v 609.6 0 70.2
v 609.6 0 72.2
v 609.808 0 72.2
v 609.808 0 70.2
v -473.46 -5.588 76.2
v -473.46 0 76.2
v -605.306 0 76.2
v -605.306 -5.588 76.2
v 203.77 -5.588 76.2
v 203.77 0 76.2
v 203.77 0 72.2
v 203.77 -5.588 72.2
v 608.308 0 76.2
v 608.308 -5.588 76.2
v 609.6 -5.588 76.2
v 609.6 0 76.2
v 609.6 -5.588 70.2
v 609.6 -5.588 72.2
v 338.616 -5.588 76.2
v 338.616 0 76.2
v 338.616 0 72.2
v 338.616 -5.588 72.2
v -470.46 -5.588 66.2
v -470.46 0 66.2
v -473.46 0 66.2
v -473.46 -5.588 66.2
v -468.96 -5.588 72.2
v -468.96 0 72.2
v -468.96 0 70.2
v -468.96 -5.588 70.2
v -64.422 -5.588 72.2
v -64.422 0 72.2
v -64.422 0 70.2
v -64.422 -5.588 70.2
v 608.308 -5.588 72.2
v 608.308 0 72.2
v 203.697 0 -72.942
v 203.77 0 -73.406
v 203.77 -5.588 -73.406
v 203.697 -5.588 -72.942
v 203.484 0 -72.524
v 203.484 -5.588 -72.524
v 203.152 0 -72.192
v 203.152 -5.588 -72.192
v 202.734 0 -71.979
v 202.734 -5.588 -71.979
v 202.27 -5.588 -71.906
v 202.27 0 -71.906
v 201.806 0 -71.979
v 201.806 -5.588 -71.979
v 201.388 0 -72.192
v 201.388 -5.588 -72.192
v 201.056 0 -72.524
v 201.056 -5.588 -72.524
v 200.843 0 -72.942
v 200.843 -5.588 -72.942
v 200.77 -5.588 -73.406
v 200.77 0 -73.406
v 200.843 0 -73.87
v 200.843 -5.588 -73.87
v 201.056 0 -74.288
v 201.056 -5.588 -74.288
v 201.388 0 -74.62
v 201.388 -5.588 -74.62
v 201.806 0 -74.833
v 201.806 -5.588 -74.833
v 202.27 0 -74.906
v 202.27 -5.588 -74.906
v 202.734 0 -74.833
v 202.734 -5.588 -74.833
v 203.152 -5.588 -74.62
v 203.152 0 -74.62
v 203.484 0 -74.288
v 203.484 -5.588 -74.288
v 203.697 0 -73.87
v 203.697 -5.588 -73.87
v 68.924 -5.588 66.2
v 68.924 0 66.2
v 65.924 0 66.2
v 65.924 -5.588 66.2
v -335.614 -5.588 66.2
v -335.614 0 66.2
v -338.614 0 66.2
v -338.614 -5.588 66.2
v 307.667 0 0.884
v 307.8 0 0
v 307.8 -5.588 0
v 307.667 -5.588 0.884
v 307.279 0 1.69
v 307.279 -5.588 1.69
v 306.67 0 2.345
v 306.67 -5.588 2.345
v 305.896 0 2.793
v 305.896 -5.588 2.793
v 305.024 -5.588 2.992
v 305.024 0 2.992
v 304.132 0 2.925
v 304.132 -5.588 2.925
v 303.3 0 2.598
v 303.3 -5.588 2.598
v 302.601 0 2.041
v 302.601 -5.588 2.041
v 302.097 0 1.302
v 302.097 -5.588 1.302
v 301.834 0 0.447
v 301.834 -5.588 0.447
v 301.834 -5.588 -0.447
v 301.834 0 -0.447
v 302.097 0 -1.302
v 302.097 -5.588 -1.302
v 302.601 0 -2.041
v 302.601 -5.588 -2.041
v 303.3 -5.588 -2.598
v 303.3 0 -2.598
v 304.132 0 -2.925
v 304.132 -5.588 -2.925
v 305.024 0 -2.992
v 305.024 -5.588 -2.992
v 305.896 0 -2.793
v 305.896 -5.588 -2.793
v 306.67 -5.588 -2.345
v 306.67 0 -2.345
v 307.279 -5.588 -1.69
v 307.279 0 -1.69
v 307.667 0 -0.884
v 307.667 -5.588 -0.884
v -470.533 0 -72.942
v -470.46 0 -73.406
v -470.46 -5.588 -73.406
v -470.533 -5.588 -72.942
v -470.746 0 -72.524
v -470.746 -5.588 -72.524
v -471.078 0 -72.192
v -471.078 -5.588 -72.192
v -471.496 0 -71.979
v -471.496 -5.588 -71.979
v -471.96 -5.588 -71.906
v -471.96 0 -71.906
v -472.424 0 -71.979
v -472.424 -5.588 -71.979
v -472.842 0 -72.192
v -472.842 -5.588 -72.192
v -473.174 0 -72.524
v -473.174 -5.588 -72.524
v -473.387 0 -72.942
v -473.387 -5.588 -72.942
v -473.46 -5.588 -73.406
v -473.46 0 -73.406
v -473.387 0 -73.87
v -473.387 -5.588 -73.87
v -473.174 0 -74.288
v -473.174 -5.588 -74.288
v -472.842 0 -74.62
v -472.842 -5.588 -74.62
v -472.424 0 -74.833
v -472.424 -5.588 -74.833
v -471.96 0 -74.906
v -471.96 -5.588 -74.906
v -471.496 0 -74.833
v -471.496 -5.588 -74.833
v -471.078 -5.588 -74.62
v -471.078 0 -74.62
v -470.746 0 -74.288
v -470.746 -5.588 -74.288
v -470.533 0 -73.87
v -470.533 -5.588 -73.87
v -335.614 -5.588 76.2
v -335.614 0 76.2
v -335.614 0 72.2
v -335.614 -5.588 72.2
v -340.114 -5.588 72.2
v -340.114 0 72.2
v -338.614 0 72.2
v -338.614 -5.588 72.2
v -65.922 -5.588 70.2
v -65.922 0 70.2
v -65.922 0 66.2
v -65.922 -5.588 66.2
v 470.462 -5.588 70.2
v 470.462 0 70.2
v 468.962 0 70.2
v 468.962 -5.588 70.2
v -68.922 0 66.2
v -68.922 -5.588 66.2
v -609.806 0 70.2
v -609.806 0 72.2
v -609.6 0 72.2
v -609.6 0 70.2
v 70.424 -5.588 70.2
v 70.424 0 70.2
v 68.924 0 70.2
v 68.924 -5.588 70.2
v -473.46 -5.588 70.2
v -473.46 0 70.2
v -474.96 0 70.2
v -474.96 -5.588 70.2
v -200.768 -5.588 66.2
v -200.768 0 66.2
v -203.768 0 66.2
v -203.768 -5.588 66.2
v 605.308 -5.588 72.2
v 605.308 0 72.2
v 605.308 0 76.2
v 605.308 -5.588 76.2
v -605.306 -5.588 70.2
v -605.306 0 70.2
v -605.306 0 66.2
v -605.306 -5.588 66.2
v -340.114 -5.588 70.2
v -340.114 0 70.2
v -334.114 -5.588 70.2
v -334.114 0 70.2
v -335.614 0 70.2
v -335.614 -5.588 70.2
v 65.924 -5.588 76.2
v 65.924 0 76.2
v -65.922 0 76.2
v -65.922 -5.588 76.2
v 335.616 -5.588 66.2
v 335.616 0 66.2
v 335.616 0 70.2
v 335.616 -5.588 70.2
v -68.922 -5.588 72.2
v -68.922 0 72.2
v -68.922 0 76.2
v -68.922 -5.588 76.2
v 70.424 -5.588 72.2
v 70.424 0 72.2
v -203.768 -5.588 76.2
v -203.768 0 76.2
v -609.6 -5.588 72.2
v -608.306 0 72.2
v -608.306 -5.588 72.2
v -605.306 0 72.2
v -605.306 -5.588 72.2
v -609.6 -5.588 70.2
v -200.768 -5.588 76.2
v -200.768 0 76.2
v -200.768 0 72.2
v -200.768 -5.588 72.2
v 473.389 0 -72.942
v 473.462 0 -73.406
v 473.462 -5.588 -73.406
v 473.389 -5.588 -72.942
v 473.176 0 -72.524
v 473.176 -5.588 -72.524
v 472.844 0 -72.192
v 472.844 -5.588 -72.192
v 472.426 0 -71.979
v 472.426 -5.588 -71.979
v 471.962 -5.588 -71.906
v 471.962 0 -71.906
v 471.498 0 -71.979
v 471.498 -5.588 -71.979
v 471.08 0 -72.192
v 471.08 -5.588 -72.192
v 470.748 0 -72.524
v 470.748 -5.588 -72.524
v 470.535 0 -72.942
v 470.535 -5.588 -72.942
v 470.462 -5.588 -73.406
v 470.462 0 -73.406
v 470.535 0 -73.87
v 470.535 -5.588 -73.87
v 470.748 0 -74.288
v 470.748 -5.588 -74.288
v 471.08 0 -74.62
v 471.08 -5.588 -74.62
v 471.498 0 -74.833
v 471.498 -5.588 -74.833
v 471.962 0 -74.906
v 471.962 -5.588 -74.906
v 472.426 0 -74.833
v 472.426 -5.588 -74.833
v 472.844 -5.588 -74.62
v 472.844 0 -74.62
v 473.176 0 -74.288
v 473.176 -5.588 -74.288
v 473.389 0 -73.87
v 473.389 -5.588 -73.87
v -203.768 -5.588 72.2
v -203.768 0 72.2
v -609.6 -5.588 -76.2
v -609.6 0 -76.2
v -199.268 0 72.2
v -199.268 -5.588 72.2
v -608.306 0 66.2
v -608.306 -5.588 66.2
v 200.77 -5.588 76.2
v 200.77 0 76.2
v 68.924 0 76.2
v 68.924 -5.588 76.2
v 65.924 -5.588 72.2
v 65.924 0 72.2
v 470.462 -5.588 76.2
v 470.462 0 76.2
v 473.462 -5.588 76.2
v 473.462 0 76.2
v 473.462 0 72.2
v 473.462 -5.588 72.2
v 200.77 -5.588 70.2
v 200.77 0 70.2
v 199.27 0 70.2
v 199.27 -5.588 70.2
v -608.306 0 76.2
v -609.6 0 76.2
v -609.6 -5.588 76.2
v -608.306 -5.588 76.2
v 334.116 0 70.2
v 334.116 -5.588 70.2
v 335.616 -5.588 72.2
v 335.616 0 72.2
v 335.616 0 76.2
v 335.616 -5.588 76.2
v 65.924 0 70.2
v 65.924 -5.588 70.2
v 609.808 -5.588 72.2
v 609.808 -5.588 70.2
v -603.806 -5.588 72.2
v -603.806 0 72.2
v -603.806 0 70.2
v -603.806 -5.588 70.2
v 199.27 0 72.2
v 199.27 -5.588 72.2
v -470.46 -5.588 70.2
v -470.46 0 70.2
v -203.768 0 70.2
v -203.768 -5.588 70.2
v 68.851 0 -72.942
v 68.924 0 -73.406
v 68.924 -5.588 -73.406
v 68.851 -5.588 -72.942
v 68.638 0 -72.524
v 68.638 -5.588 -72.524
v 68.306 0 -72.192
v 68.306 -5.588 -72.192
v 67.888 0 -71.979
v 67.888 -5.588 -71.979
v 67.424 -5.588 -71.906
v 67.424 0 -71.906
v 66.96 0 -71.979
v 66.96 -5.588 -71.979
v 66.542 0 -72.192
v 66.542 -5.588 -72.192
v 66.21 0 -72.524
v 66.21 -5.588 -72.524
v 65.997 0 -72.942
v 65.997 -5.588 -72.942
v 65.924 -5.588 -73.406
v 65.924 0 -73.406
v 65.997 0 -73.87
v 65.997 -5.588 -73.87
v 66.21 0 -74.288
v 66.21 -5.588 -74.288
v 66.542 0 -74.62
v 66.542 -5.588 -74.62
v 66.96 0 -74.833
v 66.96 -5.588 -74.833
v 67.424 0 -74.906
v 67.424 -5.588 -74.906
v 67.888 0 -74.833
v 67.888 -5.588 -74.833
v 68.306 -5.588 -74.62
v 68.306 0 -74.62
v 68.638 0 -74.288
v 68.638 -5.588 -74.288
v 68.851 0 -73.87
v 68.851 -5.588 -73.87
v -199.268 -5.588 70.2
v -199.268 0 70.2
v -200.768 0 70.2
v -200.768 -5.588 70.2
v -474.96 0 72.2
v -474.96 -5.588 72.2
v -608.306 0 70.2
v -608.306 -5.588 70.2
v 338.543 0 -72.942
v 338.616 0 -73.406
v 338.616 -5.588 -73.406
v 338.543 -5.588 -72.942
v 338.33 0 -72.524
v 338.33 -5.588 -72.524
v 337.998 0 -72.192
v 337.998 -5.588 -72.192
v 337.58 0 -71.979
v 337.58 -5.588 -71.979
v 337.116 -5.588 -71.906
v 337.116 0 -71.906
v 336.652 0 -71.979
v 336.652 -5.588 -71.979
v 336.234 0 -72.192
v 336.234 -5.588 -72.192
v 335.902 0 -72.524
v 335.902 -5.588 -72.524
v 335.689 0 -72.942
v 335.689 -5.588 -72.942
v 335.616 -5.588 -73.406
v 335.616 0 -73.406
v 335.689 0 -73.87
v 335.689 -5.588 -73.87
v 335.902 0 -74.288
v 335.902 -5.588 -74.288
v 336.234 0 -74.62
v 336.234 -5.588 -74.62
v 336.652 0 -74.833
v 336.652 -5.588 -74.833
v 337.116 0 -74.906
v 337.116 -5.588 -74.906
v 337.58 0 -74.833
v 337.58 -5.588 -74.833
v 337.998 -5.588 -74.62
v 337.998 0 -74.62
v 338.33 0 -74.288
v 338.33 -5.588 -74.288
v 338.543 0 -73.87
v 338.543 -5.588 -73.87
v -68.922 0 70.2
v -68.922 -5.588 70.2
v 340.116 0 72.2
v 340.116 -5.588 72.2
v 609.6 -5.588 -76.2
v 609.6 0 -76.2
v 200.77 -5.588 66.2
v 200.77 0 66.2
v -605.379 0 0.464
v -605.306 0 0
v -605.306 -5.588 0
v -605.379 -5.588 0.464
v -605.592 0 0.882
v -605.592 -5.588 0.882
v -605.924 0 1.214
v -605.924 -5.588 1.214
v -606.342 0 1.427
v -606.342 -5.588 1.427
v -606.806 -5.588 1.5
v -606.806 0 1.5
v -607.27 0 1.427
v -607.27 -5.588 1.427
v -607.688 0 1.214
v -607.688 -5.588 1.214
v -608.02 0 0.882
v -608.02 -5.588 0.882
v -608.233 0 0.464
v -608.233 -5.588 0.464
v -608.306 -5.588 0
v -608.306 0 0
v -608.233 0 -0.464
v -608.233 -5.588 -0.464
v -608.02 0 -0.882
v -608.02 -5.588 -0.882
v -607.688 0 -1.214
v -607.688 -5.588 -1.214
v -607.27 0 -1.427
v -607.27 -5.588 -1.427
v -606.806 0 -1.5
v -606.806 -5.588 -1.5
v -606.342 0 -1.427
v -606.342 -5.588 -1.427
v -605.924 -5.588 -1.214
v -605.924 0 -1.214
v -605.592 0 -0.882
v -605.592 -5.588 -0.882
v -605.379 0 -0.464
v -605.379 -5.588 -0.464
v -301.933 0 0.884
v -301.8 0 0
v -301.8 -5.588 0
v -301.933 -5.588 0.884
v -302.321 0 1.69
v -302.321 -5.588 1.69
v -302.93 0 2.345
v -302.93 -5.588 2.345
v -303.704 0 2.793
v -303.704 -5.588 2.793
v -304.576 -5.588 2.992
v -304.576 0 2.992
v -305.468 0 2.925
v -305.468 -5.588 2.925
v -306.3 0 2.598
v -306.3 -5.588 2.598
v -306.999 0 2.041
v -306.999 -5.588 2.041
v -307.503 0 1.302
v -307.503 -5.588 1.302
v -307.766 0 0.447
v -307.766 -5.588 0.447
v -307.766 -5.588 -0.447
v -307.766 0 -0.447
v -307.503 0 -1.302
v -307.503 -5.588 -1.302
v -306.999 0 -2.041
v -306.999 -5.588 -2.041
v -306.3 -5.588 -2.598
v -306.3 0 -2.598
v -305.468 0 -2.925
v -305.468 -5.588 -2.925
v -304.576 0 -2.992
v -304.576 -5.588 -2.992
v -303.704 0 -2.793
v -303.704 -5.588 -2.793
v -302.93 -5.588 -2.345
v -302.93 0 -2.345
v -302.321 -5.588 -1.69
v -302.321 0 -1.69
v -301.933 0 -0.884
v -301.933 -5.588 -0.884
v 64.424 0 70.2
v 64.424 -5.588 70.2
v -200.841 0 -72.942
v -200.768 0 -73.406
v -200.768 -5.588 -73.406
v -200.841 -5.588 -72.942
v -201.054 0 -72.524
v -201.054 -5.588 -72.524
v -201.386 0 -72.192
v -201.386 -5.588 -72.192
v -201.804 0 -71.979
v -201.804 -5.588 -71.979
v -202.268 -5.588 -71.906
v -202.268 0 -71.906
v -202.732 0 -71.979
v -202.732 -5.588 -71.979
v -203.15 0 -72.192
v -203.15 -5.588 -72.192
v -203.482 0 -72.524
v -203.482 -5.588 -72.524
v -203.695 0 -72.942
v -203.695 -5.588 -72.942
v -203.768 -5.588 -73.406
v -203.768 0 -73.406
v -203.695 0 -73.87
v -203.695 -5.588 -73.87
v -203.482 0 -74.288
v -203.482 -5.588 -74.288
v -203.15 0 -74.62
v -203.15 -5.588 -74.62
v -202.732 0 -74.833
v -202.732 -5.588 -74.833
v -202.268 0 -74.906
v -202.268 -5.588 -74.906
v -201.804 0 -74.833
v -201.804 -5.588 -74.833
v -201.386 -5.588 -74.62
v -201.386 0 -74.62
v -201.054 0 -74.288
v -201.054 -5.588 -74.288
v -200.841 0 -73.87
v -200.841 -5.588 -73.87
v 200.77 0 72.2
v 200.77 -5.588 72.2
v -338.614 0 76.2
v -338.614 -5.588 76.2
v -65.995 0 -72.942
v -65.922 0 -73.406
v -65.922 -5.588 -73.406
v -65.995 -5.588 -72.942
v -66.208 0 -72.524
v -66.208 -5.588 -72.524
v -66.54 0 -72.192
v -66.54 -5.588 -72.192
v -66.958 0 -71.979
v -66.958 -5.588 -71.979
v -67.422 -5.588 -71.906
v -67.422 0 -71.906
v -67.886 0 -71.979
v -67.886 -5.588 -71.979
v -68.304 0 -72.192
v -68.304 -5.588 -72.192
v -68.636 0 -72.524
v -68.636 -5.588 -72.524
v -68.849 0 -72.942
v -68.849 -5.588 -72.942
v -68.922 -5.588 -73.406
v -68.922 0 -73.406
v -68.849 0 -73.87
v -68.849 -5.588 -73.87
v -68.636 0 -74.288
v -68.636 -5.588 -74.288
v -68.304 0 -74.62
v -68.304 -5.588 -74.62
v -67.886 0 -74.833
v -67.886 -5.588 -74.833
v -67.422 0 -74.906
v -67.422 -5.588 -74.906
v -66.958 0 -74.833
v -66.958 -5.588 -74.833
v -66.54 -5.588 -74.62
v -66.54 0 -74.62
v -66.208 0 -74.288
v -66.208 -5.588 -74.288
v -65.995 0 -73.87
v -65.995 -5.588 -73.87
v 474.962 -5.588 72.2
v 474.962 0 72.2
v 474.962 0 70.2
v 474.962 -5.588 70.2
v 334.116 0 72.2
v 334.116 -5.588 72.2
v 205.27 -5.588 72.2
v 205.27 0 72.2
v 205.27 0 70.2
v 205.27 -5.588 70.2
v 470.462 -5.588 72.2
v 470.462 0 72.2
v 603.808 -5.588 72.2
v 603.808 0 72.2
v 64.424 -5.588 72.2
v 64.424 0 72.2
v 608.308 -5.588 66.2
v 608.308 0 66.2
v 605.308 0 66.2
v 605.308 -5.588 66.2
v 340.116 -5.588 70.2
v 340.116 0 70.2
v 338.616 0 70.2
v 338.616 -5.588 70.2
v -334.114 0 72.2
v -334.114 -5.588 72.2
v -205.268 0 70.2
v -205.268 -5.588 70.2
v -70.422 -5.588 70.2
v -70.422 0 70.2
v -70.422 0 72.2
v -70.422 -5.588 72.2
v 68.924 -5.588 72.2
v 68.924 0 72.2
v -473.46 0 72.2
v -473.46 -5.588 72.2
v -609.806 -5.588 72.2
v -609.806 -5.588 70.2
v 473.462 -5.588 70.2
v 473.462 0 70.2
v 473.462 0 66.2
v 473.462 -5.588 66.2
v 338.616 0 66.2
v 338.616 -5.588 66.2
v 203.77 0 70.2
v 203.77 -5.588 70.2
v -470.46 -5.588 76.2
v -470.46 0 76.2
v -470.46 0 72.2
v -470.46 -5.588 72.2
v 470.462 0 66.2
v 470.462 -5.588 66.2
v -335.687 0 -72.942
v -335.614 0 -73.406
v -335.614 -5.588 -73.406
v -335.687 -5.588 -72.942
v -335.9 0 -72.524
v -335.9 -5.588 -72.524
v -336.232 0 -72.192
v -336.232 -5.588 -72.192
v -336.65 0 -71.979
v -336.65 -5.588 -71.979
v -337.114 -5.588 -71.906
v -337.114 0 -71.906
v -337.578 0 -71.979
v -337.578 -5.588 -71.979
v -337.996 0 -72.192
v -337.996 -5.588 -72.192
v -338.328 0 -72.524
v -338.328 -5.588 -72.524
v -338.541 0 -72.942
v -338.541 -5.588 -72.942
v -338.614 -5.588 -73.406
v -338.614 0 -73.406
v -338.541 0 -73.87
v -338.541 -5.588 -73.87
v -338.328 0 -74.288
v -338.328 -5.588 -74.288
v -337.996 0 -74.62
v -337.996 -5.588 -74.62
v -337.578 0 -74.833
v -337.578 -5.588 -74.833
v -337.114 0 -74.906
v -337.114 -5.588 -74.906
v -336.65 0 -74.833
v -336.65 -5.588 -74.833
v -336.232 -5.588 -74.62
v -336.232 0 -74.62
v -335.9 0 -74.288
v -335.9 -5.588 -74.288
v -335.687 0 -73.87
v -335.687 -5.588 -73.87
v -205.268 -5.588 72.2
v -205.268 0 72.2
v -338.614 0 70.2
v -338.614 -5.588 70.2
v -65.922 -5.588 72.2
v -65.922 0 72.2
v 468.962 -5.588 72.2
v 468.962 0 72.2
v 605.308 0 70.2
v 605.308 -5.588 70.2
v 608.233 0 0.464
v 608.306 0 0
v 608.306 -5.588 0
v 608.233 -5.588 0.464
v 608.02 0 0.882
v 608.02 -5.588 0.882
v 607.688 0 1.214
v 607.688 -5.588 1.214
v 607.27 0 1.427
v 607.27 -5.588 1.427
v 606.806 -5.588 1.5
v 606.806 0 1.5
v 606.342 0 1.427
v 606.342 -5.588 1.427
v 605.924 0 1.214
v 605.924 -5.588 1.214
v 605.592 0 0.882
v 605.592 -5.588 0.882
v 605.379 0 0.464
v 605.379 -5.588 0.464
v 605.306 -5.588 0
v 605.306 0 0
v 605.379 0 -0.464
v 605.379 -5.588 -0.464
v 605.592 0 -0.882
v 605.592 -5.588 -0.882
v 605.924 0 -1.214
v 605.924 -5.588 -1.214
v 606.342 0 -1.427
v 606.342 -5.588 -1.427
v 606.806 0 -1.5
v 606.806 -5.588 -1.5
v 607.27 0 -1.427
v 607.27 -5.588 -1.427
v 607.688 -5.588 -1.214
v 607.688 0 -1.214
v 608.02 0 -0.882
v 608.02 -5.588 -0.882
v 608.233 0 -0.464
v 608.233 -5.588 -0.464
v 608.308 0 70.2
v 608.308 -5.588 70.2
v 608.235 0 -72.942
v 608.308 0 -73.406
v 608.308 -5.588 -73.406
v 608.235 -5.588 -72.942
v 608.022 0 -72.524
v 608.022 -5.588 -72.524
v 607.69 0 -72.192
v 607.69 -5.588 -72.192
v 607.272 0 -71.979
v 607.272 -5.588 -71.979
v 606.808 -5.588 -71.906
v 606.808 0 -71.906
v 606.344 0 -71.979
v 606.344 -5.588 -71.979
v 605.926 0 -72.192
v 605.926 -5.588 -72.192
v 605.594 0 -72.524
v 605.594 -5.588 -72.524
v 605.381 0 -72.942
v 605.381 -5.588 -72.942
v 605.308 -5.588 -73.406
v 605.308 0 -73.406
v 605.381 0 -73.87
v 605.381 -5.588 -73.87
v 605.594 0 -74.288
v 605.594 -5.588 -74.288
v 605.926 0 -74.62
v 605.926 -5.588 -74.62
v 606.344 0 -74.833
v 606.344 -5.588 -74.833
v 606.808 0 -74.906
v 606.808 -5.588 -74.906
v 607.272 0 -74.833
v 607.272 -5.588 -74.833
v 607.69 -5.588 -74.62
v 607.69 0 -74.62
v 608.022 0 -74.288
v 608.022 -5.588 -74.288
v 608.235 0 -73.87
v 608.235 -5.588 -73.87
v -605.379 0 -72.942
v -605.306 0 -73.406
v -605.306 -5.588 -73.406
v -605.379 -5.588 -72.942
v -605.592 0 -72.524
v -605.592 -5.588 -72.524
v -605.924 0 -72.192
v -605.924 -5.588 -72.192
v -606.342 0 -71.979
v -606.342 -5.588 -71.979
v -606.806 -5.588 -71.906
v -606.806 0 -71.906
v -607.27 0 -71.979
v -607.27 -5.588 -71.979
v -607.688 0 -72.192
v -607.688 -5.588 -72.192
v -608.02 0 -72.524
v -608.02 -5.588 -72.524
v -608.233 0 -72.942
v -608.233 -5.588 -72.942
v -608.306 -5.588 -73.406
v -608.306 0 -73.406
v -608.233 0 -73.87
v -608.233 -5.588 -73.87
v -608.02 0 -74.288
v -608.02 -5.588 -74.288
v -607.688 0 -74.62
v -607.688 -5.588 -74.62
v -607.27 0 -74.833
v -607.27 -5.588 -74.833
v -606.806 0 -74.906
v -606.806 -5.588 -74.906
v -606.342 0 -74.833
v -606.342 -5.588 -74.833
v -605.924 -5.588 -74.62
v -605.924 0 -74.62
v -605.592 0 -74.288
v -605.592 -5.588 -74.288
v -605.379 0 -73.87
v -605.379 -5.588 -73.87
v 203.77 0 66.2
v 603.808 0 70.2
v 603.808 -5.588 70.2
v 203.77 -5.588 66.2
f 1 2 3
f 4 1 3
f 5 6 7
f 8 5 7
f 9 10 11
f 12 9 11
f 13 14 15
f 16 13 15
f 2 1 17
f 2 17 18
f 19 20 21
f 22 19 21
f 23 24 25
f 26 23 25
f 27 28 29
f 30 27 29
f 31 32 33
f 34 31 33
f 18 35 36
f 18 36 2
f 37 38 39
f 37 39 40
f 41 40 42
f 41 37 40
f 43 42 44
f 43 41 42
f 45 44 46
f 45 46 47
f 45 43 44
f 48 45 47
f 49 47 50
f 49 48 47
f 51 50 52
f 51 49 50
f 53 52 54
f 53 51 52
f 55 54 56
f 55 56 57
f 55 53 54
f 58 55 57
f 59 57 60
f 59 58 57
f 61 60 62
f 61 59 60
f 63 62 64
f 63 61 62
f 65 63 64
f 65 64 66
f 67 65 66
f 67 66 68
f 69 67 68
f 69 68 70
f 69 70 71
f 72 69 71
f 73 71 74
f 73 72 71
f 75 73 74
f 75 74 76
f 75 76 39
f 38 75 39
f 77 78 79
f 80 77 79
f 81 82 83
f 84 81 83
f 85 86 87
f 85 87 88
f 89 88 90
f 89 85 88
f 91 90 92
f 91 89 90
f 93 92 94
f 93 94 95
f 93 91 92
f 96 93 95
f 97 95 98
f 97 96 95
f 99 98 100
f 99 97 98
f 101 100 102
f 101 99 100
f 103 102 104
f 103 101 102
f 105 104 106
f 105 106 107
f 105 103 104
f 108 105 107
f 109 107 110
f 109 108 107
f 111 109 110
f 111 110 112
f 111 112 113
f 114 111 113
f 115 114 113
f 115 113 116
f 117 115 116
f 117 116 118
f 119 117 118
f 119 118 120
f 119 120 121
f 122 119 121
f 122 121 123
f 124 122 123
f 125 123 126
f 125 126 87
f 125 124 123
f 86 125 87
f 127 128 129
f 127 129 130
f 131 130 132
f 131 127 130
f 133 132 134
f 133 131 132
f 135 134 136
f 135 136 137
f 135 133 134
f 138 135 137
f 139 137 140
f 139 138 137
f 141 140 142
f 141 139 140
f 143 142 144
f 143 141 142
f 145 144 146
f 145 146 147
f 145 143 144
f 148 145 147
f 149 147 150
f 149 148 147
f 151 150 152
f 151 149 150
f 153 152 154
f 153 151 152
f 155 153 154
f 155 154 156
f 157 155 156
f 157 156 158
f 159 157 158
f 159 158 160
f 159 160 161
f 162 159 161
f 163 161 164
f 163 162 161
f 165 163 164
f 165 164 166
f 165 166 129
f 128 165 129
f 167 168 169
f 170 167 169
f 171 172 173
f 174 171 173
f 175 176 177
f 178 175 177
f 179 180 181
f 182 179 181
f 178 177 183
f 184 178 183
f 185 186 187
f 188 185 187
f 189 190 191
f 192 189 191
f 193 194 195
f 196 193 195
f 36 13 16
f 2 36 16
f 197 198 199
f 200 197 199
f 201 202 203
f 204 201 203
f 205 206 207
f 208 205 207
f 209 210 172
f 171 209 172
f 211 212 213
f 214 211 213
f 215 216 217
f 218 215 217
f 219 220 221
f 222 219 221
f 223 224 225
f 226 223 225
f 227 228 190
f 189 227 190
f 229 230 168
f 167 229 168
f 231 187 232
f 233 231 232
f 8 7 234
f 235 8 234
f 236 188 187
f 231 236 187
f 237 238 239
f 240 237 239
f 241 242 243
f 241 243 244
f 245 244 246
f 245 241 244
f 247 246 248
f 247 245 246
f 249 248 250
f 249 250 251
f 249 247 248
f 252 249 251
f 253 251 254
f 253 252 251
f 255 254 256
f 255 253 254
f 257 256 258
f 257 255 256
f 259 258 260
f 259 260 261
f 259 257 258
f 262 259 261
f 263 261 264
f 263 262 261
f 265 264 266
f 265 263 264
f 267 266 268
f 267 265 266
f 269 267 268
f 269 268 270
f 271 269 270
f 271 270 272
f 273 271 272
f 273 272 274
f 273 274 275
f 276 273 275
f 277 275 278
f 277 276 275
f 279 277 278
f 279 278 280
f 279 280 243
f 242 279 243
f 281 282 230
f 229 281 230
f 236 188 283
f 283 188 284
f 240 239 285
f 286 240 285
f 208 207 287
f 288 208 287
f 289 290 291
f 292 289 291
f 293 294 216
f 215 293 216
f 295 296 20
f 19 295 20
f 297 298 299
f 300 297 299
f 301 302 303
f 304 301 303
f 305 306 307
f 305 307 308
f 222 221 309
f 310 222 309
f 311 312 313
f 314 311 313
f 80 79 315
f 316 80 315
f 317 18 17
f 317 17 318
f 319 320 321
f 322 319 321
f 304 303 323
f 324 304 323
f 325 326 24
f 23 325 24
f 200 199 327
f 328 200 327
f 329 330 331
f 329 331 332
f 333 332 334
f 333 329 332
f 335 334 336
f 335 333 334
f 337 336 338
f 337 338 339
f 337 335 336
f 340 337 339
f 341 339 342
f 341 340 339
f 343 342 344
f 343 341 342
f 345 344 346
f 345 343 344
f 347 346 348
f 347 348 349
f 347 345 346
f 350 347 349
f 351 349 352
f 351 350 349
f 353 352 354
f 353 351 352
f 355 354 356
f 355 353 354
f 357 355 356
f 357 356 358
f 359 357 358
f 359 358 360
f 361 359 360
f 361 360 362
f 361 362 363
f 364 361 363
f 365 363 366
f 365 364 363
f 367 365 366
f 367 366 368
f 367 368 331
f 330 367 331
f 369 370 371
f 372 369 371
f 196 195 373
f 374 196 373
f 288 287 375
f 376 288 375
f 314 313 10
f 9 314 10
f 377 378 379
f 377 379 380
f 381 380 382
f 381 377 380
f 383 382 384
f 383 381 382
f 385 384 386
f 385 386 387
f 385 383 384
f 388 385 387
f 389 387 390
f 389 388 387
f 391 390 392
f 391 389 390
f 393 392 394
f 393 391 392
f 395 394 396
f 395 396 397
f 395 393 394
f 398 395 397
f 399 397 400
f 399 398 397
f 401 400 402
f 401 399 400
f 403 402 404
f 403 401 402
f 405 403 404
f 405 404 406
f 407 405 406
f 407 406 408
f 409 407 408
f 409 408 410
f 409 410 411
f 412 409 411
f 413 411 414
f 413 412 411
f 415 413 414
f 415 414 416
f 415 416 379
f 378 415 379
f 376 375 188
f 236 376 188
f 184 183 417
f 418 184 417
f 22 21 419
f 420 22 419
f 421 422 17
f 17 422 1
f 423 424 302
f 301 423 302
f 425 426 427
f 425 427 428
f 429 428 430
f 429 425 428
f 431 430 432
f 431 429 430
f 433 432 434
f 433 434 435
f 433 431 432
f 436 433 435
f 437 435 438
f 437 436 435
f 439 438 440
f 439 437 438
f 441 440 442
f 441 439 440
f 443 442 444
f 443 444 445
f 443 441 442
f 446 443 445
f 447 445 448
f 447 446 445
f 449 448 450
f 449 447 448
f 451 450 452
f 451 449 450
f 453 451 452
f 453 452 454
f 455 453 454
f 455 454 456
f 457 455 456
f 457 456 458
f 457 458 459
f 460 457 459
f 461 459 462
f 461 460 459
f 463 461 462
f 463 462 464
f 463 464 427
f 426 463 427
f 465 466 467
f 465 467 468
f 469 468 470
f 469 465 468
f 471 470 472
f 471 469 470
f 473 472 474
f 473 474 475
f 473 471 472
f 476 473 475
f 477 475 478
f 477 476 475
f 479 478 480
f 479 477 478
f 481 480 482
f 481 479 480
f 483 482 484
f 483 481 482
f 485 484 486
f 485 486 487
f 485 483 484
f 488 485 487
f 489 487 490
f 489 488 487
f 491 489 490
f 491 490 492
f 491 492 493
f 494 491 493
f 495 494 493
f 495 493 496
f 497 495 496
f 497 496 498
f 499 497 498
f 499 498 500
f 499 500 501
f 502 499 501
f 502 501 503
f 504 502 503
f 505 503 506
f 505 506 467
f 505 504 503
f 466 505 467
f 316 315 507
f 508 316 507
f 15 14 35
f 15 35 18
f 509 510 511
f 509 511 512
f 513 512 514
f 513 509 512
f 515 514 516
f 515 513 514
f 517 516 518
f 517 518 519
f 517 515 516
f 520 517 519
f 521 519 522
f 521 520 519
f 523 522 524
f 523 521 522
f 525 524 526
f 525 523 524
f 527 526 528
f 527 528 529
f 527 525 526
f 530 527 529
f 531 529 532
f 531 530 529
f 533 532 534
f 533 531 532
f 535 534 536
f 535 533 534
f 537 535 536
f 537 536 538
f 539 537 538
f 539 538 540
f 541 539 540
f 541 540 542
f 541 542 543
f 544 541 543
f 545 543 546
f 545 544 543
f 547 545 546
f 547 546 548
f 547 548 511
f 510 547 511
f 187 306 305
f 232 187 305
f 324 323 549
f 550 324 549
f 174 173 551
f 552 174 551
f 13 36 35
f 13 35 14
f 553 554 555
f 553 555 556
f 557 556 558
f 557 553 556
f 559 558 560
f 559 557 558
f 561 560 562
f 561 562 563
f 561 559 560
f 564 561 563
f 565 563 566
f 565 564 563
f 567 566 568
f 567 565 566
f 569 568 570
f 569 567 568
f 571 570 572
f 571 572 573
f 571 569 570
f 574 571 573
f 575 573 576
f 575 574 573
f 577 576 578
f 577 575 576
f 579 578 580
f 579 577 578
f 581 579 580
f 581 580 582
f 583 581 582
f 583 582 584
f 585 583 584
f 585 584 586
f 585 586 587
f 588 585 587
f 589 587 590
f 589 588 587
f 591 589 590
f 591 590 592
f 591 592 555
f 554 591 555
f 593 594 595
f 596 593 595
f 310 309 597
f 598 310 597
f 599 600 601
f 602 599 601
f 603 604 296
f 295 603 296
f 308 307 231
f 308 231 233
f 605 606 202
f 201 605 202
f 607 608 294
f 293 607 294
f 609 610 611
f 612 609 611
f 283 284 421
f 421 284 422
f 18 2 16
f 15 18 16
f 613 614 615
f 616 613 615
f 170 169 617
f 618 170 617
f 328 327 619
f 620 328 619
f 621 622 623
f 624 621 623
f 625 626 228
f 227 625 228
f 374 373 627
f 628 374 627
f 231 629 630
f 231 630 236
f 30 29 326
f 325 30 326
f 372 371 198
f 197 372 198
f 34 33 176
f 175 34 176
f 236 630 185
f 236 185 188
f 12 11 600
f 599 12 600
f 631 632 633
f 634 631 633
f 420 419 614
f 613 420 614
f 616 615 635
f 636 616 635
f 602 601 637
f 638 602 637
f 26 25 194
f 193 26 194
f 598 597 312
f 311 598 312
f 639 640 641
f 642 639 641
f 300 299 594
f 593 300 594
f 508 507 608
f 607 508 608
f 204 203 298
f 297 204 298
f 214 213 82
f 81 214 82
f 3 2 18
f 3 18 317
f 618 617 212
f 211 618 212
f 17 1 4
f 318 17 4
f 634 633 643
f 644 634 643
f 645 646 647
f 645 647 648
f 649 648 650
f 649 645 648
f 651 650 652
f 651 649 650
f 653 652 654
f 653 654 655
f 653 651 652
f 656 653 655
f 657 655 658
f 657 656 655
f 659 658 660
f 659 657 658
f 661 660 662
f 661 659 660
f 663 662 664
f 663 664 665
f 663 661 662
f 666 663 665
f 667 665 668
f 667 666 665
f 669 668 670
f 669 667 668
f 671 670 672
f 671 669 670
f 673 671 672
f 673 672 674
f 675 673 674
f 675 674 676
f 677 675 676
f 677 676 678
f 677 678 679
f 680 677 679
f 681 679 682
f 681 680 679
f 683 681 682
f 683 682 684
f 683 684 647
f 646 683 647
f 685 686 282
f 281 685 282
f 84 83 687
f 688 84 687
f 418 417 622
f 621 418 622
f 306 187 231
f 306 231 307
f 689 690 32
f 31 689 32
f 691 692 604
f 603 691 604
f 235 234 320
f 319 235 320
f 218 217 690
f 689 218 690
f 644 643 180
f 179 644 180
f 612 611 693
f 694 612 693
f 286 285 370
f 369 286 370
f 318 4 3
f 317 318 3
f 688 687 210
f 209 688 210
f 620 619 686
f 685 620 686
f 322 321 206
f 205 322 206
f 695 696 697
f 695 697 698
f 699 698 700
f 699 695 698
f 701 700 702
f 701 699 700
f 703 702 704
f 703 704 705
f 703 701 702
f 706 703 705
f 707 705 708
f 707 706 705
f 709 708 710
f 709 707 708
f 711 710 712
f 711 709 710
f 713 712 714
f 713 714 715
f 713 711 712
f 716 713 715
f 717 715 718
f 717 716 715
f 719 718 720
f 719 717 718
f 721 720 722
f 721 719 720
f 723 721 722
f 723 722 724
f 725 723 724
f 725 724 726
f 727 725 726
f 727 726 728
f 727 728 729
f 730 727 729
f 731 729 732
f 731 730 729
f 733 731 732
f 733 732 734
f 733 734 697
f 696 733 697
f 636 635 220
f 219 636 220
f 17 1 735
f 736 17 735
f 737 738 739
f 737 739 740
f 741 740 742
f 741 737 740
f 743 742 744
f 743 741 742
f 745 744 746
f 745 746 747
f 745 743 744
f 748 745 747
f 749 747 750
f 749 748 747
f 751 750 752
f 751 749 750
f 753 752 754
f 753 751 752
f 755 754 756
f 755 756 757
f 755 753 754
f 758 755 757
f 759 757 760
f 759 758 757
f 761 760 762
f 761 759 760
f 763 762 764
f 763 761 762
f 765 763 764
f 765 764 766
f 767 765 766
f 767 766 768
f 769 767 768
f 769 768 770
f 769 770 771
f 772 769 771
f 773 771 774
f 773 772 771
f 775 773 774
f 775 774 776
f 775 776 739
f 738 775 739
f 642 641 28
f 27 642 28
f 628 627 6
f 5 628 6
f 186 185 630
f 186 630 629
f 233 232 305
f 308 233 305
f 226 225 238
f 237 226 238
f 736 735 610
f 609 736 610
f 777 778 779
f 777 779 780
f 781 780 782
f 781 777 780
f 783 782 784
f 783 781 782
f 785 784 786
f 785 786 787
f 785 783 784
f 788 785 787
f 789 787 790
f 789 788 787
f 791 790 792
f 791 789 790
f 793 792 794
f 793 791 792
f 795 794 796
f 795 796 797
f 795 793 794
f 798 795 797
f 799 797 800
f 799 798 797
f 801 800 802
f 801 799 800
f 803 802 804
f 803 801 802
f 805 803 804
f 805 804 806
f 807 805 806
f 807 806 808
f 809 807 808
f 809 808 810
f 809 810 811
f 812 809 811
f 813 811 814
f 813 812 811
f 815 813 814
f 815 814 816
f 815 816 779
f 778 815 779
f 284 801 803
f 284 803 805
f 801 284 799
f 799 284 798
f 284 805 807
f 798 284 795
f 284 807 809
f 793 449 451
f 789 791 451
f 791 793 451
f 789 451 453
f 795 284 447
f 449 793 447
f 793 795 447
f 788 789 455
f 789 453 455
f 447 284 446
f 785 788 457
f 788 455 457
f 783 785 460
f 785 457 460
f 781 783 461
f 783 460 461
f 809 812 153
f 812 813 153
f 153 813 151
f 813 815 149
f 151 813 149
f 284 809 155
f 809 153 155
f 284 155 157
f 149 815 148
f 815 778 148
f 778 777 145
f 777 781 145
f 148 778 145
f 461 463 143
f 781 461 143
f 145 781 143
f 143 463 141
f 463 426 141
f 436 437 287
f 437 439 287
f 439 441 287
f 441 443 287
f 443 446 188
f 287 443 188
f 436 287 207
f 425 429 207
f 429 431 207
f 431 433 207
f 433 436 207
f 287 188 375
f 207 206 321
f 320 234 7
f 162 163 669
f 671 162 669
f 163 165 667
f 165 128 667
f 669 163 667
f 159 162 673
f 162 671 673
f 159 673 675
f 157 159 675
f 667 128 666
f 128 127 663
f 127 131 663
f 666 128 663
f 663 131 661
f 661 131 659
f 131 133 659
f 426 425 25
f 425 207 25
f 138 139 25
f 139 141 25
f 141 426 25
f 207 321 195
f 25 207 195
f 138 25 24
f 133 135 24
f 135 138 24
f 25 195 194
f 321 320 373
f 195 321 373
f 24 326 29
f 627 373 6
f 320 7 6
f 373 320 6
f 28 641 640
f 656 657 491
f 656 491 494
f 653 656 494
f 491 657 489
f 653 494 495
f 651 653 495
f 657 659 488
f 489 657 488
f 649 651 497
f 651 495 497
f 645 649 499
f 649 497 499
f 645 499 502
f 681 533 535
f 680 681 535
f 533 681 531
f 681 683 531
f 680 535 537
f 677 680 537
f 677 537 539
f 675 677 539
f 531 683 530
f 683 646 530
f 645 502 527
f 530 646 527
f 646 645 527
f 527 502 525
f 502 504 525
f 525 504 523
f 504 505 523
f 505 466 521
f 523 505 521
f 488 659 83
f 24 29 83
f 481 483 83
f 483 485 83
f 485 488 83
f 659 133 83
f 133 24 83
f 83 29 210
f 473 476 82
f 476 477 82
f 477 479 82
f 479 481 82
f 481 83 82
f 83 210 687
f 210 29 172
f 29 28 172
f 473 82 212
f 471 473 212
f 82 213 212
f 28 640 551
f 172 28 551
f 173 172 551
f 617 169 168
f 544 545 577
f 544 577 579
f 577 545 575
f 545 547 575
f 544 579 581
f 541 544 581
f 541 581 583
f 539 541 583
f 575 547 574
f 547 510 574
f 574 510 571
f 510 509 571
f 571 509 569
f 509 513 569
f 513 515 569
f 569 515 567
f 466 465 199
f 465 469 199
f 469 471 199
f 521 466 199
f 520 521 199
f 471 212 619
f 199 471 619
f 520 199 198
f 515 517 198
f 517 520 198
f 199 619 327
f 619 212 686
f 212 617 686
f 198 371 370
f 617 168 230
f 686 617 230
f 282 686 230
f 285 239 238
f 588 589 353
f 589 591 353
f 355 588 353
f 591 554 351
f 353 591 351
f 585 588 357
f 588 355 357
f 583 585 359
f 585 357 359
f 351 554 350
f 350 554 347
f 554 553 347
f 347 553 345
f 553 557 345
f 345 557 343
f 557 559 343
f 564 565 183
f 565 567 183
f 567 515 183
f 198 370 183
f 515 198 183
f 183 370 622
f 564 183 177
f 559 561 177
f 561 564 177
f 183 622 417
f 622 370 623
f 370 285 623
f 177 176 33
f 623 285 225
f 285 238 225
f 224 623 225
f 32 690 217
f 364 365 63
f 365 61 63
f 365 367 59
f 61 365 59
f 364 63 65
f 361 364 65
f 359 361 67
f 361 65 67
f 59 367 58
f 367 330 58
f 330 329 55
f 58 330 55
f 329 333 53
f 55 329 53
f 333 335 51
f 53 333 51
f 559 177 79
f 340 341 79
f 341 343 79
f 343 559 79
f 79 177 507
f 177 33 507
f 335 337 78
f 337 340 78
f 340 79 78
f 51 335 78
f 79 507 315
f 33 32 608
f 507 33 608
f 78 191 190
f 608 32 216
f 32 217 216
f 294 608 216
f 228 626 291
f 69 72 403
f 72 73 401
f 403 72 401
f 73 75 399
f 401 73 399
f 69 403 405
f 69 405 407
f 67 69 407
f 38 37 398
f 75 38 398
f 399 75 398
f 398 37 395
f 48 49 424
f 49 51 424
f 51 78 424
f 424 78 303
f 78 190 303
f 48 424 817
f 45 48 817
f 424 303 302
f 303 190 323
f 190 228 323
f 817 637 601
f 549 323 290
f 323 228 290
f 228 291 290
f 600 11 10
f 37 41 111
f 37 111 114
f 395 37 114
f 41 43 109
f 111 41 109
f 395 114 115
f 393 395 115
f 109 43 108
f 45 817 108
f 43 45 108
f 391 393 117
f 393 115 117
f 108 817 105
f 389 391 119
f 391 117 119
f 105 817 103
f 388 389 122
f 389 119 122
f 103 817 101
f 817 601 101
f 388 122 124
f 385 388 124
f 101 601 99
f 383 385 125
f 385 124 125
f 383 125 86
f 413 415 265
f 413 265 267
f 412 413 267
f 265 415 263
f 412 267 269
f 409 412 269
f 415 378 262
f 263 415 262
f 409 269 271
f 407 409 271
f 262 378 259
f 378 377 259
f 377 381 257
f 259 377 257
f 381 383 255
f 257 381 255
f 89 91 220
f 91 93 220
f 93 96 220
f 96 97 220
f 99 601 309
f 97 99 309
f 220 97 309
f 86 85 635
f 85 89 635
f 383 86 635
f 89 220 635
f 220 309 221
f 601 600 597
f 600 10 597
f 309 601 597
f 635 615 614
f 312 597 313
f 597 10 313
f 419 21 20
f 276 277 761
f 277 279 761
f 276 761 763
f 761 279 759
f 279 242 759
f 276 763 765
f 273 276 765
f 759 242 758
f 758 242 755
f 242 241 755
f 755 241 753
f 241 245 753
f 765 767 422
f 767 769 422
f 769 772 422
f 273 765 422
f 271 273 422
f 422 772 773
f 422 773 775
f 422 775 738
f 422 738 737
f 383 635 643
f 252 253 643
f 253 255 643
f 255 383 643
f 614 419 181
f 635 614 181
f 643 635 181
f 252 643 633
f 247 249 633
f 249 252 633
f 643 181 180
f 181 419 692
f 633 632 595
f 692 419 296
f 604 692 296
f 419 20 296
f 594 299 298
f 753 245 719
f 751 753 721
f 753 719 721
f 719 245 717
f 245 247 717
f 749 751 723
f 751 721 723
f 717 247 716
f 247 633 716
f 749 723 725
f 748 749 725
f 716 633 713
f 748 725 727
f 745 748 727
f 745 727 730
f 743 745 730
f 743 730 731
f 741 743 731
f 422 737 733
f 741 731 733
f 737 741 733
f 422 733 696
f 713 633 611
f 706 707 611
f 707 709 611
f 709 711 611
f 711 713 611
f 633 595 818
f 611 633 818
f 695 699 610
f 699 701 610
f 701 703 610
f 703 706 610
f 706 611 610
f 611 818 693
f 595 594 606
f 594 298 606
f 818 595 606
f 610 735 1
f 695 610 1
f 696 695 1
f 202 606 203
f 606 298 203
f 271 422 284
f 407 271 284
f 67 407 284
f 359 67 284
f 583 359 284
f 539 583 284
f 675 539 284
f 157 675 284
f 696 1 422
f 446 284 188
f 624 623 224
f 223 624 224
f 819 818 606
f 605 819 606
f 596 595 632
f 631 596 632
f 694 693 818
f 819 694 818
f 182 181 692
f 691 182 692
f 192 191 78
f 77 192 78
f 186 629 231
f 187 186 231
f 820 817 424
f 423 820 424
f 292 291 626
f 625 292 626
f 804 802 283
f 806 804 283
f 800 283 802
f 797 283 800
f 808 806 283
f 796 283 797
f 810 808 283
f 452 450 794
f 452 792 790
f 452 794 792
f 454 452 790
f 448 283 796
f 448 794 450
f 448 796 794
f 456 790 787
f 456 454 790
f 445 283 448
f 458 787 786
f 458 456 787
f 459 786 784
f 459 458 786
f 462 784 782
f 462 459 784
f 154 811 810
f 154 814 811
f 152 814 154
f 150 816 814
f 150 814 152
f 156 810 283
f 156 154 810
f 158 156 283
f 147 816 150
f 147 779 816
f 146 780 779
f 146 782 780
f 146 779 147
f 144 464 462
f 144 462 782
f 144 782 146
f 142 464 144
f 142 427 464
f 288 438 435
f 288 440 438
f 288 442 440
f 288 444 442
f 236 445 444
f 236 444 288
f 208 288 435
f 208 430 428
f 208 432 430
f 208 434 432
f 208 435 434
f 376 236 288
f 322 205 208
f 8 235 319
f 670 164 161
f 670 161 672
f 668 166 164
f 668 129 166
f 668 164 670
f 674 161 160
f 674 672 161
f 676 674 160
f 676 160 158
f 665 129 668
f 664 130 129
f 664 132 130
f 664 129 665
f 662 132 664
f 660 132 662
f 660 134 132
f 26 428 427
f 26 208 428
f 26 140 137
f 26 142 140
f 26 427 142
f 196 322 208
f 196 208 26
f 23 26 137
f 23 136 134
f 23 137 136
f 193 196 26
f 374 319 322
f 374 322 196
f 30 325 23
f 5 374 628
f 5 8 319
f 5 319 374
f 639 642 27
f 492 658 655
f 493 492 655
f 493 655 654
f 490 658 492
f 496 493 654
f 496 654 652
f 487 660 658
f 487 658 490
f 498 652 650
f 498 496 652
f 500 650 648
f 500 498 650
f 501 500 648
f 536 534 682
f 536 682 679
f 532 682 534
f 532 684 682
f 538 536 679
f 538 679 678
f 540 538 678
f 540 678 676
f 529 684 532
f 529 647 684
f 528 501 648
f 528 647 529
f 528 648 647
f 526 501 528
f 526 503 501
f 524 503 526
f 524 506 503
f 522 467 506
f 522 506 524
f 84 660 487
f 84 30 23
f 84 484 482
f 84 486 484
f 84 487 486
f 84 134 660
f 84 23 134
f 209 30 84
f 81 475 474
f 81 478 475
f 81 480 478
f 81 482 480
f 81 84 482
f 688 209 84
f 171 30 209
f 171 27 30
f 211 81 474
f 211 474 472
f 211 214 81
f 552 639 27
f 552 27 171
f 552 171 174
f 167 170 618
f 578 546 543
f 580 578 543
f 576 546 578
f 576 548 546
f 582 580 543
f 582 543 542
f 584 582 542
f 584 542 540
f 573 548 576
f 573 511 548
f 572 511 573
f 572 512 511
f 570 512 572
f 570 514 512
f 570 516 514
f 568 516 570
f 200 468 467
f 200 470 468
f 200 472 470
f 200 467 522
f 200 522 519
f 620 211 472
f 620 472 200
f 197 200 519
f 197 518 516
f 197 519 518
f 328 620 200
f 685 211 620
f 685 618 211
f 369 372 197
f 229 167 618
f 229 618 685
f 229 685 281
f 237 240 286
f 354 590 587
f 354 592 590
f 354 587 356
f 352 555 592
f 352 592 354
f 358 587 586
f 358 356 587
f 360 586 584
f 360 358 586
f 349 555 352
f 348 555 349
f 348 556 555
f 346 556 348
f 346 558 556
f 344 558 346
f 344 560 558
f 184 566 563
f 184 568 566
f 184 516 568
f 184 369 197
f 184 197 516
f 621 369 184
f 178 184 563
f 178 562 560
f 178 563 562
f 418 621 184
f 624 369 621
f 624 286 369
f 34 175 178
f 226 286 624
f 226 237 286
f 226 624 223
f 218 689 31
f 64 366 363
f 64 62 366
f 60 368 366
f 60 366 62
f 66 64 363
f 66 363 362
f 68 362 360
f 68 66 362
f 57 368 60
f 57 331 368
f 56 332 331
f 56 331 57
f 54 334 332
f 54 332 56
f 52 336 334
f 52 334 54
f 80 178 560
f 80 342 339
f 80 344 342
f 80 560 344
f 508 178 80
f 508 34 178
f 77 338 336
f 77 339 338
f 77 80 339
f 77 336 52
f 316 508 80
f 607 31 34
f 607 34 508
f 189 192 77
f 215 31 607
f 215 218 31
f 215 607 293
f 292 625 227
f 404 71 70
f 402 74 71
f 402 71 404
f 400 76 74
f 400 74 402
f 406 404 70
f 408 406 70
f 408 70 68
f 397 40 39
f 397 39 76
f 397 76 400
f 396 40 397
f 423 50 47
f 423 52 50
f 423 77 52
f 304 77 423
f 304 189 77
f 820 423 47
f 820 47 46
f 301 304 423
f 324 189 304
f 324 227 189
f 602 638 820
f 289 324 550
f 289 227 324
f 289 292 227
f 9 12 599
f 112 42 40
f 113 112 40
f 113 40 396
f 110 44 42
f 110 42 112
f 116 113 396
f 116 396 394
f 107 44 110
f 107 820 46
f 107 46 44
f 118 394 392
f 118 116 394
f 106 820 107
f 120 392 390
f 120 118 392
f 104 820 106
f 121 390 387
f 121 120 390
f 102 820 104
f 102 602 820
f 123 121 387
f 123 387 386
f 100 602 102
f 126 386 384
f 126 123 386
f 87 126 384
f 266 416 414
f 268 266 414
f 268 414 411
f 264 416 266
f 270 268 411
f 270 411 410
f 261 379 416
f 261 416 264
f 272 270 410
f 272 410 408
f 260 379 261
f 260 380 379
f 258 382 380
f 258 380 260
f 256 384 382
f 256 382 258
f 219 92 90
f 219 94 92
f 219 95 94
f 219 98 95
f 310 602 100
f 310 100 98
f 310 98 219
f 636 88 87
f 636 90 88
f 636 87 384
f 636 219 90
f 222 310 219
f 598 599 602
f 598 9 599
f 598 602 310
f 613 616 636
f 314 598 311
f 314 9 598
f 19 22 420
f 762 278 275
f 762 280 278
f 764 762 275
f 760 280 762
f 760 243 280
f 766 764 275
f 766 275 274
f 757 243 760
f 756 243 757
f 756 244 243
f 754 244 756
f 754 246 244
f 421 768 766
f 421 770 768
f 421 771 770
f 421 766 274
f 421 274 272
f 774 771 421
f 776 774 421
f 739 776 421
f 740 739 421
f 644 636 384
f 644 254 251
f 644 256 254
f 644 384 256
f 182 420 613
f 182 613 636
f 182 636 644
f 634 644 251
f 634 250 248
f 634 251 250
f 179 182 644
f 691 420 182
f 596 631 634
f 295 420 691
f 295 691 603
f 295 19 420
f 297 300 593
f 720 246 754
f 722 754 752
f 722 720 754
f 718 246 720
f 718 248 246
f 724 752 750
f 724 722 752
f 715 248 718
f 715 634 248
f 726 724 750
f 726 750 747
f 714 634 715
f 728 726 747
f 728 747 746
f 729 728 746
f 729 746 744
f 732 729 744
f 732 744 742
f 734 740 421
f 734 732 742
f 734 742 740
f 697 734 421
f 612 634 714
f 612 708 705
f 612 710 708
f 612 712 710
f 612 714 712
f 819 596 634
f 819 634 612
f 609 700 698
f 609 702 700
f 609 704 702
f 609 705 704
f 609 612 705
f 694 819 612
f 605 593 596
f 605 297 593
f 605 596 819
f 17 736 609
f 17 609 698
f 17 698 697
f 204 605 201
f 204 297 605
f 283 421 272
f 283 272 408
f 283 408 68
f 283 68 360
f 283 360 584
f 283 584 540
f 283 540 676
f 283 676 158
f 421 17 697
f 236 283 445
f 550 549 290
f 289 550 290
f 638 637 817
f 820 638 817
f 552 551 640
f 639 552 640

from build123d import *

# Parameters (mm, degrees)
F0_W     = 1.294
F0_H     = 4
F0_W_2   = 0.206
F0_H_2   = 2
F0_W_3   = 1.292
F0_W_4   = 0.208
F0_R     = 1.5
F0_R_2   = 3
F1_DEPTH = 5.588


with BuildPart() as f1:
    # F0 (on Front) → F1 (new body)
    with BuildSketch(Plane.XZ):
        with Locations((-608.953, 74.2)):
            Rectangle(F0_W, F0_H)
        with Locations((-609.703, 71.2)):
            Rectangle(F0_W_2, F0_H_2)
        with Locations((608.954, 74.2)):
            Rectangle(F0_W_3, F0_H)
        with Locations((609.704, 71.2)):
            Rectangle(F0_W_4, F0_H_2)
        Polygon((-609.6, -76.2), (609.6, -76.2), (609.6, 70.2), (608.308, 70.2), (608.308, 66.2), (606.808, 66.2), (605.308, 66.2), (605.308, 70.2), (603.808, 70.2), (603.808, 72.2), (605.308, 72.2), (605.308, 76.2), (473.462, 76.2), (473.462, 72.2), (474.962, 72.2), (474.962, 70.2), (473.462, 70.2), (473.462, 66.2), (471.962, 66.2), (470.462, 66.2), (470.462, 70.2), (468.962, 70.2), (468.962, 72.2), (470.462, 72.2), (470.462, 76.2), (338.616, 76.2), (338.616, 72.2), (340.116, 72.2), (340.116, 70.2), (338.616, 70.2), (338.616, 66.2), (337.116, 66.2), (335.616, 66.2), (335.616, 70.2), (334.116, 70.2), (334.116, 72.2), (335.616, 72.2), (335.616, 76.2), (203.77, 76.2), (203.77, 72.2), (205.27, 72.2), (205.27, 70.2), (203.77, 70.2), (203.77, 66.2), (202.27, 66.2), (200.77, 66.2), (200.77, 70.2), (199.27, 70.2), (199.27, 72.2), (200.77, 72.2), (200.77, 76.2), (68.924, 76.2), (68.924, 72.2), (70.424, 72.2), (70.424, 70.2), (68.924, 70.2), (68.924, 66.2), (67.424, 66.2), (65.924, 66.2), (65.924, 70.2), (64.424, 70.2), (64.424, 72.2), (65.924, 72.2), (65.924, 76.2), (-65.922, 76.2), (-65.922, 72.2), (-64.422, 72.2), (-64.422, 70.2), (-65.922, 70.2), (-65.922, 66.2), (-67.422, 66.2), (-68.922, 66.2), (-68.922, 70.2), (-70.422, 70.2), (-70.422, 72.2), (-68.922, 72.2), (-68.922, 76.2), (-200.768, 76.2), (-200.768, 72.2), (-199.268, 72.2), (-199.268, 70.2), (-200.768, 70.2), (-200.768, 66.2), (-202.268, 66.2), (-203.768, 66.2), (-203.768, 70.2), (-205.268, 70.2), (-205.268, 72.2), (-203.768, 72.2), (-203.768, 76.2), (-335.614, 76.2), (-335.614, 72.2), (-334.114, 72.2), (-334.114, 70.2), (-335.614, 70.2), (-335.614, 66.2), (-337.114, 66.2), (-338.614, 66.2), (-338.614, 70.2), (-340.114, 70.2), (-340.114, 72.2), (-338.614, 72.2), (-338.614, 76.2), (-470.46, 76.2), (-470.46, 72.2), (-468.96, 72.2), (-468.96, 70.2), (-470.46, 70.2), (-470.46, 66.2), (-471.96, 66.2), (-473.46, 66.2), (-473.46, 70.2), (-474.96, 70.2), (-474.96, 72.2), (-473.46, 72.2), (-473.46, 76.2), (-605.306, 76.2), (-605.306, 72.2), (-603.806, 72.2), (-603.806, 70.2), (-605.306, 70.2), (-605.306, 66.2), (-606.806, 66.2), (-608.306, 66.2), (-608.306, 70.2), (-609.6, 70.2), align=None)
        with Locations((-606.806, -73.406)):
            Circle(F0_R, mode=Mode.SUBTRACT)
        with Locations((-471.96, -73.406)):
            Circle(F0_R, mode=Mode.SUBTRACT)
        with Locations((-337.114, -73.406)):
            Circle(F0_R, mode=Mode.SUBTRACT)
        with Locations((-202.268, -73.406)):
            Circle(F0_R, mode=Mode.SUBTRACT)
        with Locations((-67.422, -73.406)):
            Circle(F0_R, mode=Mode.SUBTRACT)
        with Locations((67.424, -73.406)):
            Circle(F0_R, mode=Mode.SUBTRACT)
        with Locations((202.27, -73.406)):
            Circle(F0_R, mode=Mode.SUBTRACT)
        with Locations((337.116, -73.406)):
            Circle(F0_R, mode=Mode.SUBTRACT)
        with Locations((471.962, -73.406)):
            Circle(F0_R, mode=Mode.SUBTRACT)
        with Locations((606.808, -73.406)):
            Circle(F0_R, mode=Mode.SUBTRACT)
        with Locations((-606.806, 0)):
            Circle(F0_R, mode=Mode.SUBTRACT)
        with Locations((-304.8, 0)):
            Circle(F0_R_2, mode=Mode.SUBTRACT)
        with Locations((304.8, 0)):
            Circle(F0_R_2, mode=Mode.SUBTRACT)
        with Locations((606.806, 0)):
            Circle(F0_R, mode=Mode.SUBTRACT)
    extrude(amount=F1_DEPTH)


solid = f1.part
